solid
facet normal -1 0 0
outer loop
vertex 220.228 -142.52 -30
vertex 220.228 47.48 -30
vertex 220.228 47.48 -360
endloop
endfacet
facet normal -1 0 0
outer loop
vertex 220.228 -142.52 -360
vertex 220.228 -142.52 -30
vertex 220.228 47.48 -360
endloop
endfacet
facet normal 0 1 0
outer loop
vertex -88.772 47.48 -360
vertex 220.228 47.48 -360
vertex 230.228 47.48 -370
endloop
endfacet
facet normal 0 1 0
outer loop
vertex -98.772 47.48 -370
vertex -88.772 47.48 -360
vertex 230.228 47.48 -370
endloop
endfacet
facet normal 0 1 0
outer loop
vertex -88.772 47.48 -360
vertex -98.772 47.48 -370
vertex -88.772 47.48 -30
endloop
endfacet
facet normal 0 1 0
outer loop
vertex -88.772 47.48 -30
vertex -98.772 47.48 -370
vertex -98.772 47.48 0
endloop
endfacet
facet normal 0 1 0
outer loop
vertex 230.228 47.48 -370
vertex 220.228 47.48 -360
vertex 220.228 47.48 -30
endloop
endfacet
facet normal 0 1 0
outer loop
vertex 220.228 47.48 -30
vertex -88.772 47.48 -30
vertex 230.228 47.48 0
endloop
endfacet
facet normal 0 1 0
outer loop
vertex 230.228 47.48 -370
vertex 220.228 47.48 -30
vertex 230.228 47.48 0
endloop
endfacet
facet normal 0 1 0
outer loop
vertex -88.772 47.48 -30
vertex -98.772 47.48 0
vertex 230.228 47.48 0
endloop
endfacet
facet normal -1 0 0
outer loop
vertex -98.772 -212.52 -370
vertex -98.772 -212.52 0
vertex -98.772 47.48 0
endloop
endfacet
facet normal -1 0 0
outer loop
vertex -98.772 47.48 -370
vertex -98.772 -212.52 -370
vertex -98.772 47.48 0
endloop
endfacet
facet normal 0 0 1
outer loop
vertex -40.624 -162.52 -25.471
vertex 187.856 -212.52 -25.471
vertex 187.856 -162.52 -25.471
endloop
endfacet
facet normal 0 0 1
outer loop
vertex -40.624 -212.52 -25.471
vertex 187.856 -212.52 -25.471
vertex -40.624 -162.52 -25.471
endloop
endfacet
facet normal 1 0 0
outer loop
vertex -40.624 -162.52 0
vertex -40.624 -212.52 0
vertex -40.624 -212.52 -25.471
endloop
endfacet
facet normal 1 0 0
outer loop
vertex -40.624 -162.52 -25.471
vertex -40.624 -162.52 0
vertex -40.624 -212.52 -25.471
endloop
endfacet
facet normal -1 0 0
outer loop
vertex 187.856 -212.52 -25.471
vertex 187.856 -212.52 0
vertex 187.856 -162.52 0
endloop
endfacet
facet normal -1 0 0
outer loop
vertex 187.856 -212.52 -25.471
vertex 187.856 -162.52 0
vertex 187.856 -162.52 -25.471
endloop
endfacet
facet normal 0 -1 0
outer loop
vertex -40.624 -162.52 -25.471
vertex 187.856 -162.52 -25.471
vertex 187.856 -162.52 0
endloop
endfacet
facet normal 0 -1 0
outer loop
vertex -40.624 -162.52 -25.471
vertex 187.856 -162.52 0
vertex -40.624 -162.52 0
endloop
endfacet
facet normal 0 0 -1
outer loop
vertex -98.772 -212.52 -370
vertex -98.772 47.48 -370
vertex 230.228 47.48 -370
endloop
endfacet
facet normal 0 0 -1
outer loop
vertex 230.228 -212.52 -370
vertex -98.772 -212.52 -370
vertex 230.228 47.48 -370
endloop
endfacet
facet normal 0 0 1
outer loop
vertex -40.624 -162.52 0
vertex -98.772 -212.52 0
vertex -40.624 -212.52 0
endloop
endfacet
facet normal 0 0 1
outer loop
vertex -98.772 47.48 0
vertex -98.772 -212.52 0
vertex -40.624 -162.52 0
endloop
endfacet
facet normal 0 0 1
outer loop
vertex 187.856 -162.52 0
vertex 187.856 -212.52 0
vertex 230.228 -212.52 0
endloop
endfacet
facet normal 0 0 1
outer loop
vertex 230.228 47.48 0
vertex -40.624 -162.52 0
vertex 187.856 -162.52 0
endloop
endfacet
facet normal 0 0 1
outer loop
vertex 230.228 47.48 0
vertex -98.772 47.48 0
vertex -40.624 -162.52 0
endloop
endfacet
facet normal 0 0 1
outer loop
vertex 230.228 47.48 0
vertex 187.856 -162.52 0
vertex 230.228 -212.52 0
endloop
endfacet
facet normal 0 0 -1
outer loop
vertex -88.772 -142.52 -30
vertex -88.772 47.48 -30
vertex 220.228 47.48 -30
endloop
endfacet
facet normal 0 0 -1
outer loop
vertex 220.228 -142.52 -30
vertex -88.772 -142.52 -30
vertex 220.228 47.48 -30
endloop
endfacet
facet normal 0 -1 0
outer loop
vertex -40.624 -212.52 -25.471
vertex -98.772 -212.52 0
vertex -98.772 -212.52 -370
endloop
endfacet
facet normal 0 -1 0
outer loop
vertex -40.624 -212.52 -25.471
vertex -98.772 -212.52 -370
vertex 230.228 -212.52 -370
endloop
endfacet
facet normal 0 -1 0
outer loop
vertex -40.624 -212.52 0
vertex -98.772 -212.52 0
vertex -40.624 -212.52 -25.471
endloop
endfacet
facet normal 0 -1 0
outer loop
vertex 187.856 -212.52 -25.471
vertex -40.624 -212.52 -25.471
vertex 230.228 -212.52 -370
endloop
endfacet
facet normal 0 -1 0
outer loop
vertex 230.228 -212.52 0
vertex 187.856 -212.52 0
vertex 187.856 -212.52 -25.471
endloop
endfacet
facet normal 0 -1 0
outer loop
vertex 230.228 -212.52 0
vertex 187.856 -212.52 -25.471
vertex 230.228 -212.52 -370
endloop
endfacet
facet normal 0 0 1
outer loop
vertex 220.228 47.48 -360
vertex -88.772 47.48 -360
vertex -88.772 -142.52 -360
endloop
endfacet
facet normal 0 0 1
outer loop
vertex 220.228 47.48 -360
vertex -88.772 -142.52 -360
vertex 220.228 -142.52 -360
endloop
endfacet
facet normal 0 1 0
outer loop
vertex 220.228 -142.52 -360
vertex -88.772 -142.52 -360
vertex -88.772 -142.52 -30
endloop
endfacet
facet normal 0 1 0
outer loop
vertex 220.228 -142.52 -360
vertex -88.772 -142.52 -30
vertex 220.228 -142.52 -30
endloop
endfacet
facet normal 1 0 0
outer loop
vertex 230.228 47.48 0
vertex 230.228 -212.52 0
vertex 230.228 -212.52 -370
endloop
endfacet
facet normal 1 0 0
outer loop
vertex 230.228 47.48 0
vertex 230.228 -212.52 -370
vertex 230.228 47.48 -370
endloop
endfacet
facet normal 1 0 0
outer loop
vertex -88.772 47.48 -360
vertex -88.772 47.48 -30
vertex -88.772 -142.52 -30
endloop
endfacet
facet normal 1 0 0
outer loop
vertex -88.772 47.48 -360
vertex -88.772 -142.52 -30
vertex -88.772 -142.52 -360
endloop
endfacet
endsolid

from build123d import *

# Parameters (mm, degrees)
ESQUISSE1_W             = 329
ESQUISSE1_H             = 260
BOSS_EXTRU_1_DEPTH      = 370
ESQUISSE2_W             = 309
ESQUISSE2_H             = 330
ENL_V_MAT_EXTRU_1_DEPTH = 190
ESQUISSE11_W            = 228.480314258
ESQUISSE11_H            = 25.470871893
ENL_V_MAT_EXTRU_9_DEPTH = 50


with BuildPart() as part:
    # Esquisse1 → Boss.-Extru.1 (new body)
    with BuildSketch(Plane.XY):
        with Locations((65.728262625, -82.519920319)):
            Rectangle(ESQUISSE1_W, ESQUISSE1_H)
    extrude(amount=-BOSS_EXTRU_1_DEPTH)

    # Esquisse2 → Enlèv. mat.-Extru.1 (cut)
    with BuildSketch(Plane(origin=(0, 47.480079681, 0), x_dir=(1, 0, 0), z_dir=(0, 1, 0))):
        with Locations((65.728262625, 195)):
            Rectangle(ESQUISSE2_W, ESQUISSE2_H)
    extrude(amount=-ENL_V_MAT_EXTRU_1_DEPTH, mode=Mode.SUBTRACT)

    # Esquisse11 → Enlèv. mat.-Extru.9 (cut)
    with BuildSketch(Plane(origin=(0, -212.519920319, 0), x_dir=(-1, 0, 0), z_dir=(0, -1, 0))):
        with Locations((-73.615667683, 12.735435947)):
            Rectangle(ESQUISSE11_W, ESQUISSE11_H)
    extrude(amount=-ENL_V_MAT_EXTRU_9_DEPTH, mode=Mode.SUBTRACT)


solid = part.part
